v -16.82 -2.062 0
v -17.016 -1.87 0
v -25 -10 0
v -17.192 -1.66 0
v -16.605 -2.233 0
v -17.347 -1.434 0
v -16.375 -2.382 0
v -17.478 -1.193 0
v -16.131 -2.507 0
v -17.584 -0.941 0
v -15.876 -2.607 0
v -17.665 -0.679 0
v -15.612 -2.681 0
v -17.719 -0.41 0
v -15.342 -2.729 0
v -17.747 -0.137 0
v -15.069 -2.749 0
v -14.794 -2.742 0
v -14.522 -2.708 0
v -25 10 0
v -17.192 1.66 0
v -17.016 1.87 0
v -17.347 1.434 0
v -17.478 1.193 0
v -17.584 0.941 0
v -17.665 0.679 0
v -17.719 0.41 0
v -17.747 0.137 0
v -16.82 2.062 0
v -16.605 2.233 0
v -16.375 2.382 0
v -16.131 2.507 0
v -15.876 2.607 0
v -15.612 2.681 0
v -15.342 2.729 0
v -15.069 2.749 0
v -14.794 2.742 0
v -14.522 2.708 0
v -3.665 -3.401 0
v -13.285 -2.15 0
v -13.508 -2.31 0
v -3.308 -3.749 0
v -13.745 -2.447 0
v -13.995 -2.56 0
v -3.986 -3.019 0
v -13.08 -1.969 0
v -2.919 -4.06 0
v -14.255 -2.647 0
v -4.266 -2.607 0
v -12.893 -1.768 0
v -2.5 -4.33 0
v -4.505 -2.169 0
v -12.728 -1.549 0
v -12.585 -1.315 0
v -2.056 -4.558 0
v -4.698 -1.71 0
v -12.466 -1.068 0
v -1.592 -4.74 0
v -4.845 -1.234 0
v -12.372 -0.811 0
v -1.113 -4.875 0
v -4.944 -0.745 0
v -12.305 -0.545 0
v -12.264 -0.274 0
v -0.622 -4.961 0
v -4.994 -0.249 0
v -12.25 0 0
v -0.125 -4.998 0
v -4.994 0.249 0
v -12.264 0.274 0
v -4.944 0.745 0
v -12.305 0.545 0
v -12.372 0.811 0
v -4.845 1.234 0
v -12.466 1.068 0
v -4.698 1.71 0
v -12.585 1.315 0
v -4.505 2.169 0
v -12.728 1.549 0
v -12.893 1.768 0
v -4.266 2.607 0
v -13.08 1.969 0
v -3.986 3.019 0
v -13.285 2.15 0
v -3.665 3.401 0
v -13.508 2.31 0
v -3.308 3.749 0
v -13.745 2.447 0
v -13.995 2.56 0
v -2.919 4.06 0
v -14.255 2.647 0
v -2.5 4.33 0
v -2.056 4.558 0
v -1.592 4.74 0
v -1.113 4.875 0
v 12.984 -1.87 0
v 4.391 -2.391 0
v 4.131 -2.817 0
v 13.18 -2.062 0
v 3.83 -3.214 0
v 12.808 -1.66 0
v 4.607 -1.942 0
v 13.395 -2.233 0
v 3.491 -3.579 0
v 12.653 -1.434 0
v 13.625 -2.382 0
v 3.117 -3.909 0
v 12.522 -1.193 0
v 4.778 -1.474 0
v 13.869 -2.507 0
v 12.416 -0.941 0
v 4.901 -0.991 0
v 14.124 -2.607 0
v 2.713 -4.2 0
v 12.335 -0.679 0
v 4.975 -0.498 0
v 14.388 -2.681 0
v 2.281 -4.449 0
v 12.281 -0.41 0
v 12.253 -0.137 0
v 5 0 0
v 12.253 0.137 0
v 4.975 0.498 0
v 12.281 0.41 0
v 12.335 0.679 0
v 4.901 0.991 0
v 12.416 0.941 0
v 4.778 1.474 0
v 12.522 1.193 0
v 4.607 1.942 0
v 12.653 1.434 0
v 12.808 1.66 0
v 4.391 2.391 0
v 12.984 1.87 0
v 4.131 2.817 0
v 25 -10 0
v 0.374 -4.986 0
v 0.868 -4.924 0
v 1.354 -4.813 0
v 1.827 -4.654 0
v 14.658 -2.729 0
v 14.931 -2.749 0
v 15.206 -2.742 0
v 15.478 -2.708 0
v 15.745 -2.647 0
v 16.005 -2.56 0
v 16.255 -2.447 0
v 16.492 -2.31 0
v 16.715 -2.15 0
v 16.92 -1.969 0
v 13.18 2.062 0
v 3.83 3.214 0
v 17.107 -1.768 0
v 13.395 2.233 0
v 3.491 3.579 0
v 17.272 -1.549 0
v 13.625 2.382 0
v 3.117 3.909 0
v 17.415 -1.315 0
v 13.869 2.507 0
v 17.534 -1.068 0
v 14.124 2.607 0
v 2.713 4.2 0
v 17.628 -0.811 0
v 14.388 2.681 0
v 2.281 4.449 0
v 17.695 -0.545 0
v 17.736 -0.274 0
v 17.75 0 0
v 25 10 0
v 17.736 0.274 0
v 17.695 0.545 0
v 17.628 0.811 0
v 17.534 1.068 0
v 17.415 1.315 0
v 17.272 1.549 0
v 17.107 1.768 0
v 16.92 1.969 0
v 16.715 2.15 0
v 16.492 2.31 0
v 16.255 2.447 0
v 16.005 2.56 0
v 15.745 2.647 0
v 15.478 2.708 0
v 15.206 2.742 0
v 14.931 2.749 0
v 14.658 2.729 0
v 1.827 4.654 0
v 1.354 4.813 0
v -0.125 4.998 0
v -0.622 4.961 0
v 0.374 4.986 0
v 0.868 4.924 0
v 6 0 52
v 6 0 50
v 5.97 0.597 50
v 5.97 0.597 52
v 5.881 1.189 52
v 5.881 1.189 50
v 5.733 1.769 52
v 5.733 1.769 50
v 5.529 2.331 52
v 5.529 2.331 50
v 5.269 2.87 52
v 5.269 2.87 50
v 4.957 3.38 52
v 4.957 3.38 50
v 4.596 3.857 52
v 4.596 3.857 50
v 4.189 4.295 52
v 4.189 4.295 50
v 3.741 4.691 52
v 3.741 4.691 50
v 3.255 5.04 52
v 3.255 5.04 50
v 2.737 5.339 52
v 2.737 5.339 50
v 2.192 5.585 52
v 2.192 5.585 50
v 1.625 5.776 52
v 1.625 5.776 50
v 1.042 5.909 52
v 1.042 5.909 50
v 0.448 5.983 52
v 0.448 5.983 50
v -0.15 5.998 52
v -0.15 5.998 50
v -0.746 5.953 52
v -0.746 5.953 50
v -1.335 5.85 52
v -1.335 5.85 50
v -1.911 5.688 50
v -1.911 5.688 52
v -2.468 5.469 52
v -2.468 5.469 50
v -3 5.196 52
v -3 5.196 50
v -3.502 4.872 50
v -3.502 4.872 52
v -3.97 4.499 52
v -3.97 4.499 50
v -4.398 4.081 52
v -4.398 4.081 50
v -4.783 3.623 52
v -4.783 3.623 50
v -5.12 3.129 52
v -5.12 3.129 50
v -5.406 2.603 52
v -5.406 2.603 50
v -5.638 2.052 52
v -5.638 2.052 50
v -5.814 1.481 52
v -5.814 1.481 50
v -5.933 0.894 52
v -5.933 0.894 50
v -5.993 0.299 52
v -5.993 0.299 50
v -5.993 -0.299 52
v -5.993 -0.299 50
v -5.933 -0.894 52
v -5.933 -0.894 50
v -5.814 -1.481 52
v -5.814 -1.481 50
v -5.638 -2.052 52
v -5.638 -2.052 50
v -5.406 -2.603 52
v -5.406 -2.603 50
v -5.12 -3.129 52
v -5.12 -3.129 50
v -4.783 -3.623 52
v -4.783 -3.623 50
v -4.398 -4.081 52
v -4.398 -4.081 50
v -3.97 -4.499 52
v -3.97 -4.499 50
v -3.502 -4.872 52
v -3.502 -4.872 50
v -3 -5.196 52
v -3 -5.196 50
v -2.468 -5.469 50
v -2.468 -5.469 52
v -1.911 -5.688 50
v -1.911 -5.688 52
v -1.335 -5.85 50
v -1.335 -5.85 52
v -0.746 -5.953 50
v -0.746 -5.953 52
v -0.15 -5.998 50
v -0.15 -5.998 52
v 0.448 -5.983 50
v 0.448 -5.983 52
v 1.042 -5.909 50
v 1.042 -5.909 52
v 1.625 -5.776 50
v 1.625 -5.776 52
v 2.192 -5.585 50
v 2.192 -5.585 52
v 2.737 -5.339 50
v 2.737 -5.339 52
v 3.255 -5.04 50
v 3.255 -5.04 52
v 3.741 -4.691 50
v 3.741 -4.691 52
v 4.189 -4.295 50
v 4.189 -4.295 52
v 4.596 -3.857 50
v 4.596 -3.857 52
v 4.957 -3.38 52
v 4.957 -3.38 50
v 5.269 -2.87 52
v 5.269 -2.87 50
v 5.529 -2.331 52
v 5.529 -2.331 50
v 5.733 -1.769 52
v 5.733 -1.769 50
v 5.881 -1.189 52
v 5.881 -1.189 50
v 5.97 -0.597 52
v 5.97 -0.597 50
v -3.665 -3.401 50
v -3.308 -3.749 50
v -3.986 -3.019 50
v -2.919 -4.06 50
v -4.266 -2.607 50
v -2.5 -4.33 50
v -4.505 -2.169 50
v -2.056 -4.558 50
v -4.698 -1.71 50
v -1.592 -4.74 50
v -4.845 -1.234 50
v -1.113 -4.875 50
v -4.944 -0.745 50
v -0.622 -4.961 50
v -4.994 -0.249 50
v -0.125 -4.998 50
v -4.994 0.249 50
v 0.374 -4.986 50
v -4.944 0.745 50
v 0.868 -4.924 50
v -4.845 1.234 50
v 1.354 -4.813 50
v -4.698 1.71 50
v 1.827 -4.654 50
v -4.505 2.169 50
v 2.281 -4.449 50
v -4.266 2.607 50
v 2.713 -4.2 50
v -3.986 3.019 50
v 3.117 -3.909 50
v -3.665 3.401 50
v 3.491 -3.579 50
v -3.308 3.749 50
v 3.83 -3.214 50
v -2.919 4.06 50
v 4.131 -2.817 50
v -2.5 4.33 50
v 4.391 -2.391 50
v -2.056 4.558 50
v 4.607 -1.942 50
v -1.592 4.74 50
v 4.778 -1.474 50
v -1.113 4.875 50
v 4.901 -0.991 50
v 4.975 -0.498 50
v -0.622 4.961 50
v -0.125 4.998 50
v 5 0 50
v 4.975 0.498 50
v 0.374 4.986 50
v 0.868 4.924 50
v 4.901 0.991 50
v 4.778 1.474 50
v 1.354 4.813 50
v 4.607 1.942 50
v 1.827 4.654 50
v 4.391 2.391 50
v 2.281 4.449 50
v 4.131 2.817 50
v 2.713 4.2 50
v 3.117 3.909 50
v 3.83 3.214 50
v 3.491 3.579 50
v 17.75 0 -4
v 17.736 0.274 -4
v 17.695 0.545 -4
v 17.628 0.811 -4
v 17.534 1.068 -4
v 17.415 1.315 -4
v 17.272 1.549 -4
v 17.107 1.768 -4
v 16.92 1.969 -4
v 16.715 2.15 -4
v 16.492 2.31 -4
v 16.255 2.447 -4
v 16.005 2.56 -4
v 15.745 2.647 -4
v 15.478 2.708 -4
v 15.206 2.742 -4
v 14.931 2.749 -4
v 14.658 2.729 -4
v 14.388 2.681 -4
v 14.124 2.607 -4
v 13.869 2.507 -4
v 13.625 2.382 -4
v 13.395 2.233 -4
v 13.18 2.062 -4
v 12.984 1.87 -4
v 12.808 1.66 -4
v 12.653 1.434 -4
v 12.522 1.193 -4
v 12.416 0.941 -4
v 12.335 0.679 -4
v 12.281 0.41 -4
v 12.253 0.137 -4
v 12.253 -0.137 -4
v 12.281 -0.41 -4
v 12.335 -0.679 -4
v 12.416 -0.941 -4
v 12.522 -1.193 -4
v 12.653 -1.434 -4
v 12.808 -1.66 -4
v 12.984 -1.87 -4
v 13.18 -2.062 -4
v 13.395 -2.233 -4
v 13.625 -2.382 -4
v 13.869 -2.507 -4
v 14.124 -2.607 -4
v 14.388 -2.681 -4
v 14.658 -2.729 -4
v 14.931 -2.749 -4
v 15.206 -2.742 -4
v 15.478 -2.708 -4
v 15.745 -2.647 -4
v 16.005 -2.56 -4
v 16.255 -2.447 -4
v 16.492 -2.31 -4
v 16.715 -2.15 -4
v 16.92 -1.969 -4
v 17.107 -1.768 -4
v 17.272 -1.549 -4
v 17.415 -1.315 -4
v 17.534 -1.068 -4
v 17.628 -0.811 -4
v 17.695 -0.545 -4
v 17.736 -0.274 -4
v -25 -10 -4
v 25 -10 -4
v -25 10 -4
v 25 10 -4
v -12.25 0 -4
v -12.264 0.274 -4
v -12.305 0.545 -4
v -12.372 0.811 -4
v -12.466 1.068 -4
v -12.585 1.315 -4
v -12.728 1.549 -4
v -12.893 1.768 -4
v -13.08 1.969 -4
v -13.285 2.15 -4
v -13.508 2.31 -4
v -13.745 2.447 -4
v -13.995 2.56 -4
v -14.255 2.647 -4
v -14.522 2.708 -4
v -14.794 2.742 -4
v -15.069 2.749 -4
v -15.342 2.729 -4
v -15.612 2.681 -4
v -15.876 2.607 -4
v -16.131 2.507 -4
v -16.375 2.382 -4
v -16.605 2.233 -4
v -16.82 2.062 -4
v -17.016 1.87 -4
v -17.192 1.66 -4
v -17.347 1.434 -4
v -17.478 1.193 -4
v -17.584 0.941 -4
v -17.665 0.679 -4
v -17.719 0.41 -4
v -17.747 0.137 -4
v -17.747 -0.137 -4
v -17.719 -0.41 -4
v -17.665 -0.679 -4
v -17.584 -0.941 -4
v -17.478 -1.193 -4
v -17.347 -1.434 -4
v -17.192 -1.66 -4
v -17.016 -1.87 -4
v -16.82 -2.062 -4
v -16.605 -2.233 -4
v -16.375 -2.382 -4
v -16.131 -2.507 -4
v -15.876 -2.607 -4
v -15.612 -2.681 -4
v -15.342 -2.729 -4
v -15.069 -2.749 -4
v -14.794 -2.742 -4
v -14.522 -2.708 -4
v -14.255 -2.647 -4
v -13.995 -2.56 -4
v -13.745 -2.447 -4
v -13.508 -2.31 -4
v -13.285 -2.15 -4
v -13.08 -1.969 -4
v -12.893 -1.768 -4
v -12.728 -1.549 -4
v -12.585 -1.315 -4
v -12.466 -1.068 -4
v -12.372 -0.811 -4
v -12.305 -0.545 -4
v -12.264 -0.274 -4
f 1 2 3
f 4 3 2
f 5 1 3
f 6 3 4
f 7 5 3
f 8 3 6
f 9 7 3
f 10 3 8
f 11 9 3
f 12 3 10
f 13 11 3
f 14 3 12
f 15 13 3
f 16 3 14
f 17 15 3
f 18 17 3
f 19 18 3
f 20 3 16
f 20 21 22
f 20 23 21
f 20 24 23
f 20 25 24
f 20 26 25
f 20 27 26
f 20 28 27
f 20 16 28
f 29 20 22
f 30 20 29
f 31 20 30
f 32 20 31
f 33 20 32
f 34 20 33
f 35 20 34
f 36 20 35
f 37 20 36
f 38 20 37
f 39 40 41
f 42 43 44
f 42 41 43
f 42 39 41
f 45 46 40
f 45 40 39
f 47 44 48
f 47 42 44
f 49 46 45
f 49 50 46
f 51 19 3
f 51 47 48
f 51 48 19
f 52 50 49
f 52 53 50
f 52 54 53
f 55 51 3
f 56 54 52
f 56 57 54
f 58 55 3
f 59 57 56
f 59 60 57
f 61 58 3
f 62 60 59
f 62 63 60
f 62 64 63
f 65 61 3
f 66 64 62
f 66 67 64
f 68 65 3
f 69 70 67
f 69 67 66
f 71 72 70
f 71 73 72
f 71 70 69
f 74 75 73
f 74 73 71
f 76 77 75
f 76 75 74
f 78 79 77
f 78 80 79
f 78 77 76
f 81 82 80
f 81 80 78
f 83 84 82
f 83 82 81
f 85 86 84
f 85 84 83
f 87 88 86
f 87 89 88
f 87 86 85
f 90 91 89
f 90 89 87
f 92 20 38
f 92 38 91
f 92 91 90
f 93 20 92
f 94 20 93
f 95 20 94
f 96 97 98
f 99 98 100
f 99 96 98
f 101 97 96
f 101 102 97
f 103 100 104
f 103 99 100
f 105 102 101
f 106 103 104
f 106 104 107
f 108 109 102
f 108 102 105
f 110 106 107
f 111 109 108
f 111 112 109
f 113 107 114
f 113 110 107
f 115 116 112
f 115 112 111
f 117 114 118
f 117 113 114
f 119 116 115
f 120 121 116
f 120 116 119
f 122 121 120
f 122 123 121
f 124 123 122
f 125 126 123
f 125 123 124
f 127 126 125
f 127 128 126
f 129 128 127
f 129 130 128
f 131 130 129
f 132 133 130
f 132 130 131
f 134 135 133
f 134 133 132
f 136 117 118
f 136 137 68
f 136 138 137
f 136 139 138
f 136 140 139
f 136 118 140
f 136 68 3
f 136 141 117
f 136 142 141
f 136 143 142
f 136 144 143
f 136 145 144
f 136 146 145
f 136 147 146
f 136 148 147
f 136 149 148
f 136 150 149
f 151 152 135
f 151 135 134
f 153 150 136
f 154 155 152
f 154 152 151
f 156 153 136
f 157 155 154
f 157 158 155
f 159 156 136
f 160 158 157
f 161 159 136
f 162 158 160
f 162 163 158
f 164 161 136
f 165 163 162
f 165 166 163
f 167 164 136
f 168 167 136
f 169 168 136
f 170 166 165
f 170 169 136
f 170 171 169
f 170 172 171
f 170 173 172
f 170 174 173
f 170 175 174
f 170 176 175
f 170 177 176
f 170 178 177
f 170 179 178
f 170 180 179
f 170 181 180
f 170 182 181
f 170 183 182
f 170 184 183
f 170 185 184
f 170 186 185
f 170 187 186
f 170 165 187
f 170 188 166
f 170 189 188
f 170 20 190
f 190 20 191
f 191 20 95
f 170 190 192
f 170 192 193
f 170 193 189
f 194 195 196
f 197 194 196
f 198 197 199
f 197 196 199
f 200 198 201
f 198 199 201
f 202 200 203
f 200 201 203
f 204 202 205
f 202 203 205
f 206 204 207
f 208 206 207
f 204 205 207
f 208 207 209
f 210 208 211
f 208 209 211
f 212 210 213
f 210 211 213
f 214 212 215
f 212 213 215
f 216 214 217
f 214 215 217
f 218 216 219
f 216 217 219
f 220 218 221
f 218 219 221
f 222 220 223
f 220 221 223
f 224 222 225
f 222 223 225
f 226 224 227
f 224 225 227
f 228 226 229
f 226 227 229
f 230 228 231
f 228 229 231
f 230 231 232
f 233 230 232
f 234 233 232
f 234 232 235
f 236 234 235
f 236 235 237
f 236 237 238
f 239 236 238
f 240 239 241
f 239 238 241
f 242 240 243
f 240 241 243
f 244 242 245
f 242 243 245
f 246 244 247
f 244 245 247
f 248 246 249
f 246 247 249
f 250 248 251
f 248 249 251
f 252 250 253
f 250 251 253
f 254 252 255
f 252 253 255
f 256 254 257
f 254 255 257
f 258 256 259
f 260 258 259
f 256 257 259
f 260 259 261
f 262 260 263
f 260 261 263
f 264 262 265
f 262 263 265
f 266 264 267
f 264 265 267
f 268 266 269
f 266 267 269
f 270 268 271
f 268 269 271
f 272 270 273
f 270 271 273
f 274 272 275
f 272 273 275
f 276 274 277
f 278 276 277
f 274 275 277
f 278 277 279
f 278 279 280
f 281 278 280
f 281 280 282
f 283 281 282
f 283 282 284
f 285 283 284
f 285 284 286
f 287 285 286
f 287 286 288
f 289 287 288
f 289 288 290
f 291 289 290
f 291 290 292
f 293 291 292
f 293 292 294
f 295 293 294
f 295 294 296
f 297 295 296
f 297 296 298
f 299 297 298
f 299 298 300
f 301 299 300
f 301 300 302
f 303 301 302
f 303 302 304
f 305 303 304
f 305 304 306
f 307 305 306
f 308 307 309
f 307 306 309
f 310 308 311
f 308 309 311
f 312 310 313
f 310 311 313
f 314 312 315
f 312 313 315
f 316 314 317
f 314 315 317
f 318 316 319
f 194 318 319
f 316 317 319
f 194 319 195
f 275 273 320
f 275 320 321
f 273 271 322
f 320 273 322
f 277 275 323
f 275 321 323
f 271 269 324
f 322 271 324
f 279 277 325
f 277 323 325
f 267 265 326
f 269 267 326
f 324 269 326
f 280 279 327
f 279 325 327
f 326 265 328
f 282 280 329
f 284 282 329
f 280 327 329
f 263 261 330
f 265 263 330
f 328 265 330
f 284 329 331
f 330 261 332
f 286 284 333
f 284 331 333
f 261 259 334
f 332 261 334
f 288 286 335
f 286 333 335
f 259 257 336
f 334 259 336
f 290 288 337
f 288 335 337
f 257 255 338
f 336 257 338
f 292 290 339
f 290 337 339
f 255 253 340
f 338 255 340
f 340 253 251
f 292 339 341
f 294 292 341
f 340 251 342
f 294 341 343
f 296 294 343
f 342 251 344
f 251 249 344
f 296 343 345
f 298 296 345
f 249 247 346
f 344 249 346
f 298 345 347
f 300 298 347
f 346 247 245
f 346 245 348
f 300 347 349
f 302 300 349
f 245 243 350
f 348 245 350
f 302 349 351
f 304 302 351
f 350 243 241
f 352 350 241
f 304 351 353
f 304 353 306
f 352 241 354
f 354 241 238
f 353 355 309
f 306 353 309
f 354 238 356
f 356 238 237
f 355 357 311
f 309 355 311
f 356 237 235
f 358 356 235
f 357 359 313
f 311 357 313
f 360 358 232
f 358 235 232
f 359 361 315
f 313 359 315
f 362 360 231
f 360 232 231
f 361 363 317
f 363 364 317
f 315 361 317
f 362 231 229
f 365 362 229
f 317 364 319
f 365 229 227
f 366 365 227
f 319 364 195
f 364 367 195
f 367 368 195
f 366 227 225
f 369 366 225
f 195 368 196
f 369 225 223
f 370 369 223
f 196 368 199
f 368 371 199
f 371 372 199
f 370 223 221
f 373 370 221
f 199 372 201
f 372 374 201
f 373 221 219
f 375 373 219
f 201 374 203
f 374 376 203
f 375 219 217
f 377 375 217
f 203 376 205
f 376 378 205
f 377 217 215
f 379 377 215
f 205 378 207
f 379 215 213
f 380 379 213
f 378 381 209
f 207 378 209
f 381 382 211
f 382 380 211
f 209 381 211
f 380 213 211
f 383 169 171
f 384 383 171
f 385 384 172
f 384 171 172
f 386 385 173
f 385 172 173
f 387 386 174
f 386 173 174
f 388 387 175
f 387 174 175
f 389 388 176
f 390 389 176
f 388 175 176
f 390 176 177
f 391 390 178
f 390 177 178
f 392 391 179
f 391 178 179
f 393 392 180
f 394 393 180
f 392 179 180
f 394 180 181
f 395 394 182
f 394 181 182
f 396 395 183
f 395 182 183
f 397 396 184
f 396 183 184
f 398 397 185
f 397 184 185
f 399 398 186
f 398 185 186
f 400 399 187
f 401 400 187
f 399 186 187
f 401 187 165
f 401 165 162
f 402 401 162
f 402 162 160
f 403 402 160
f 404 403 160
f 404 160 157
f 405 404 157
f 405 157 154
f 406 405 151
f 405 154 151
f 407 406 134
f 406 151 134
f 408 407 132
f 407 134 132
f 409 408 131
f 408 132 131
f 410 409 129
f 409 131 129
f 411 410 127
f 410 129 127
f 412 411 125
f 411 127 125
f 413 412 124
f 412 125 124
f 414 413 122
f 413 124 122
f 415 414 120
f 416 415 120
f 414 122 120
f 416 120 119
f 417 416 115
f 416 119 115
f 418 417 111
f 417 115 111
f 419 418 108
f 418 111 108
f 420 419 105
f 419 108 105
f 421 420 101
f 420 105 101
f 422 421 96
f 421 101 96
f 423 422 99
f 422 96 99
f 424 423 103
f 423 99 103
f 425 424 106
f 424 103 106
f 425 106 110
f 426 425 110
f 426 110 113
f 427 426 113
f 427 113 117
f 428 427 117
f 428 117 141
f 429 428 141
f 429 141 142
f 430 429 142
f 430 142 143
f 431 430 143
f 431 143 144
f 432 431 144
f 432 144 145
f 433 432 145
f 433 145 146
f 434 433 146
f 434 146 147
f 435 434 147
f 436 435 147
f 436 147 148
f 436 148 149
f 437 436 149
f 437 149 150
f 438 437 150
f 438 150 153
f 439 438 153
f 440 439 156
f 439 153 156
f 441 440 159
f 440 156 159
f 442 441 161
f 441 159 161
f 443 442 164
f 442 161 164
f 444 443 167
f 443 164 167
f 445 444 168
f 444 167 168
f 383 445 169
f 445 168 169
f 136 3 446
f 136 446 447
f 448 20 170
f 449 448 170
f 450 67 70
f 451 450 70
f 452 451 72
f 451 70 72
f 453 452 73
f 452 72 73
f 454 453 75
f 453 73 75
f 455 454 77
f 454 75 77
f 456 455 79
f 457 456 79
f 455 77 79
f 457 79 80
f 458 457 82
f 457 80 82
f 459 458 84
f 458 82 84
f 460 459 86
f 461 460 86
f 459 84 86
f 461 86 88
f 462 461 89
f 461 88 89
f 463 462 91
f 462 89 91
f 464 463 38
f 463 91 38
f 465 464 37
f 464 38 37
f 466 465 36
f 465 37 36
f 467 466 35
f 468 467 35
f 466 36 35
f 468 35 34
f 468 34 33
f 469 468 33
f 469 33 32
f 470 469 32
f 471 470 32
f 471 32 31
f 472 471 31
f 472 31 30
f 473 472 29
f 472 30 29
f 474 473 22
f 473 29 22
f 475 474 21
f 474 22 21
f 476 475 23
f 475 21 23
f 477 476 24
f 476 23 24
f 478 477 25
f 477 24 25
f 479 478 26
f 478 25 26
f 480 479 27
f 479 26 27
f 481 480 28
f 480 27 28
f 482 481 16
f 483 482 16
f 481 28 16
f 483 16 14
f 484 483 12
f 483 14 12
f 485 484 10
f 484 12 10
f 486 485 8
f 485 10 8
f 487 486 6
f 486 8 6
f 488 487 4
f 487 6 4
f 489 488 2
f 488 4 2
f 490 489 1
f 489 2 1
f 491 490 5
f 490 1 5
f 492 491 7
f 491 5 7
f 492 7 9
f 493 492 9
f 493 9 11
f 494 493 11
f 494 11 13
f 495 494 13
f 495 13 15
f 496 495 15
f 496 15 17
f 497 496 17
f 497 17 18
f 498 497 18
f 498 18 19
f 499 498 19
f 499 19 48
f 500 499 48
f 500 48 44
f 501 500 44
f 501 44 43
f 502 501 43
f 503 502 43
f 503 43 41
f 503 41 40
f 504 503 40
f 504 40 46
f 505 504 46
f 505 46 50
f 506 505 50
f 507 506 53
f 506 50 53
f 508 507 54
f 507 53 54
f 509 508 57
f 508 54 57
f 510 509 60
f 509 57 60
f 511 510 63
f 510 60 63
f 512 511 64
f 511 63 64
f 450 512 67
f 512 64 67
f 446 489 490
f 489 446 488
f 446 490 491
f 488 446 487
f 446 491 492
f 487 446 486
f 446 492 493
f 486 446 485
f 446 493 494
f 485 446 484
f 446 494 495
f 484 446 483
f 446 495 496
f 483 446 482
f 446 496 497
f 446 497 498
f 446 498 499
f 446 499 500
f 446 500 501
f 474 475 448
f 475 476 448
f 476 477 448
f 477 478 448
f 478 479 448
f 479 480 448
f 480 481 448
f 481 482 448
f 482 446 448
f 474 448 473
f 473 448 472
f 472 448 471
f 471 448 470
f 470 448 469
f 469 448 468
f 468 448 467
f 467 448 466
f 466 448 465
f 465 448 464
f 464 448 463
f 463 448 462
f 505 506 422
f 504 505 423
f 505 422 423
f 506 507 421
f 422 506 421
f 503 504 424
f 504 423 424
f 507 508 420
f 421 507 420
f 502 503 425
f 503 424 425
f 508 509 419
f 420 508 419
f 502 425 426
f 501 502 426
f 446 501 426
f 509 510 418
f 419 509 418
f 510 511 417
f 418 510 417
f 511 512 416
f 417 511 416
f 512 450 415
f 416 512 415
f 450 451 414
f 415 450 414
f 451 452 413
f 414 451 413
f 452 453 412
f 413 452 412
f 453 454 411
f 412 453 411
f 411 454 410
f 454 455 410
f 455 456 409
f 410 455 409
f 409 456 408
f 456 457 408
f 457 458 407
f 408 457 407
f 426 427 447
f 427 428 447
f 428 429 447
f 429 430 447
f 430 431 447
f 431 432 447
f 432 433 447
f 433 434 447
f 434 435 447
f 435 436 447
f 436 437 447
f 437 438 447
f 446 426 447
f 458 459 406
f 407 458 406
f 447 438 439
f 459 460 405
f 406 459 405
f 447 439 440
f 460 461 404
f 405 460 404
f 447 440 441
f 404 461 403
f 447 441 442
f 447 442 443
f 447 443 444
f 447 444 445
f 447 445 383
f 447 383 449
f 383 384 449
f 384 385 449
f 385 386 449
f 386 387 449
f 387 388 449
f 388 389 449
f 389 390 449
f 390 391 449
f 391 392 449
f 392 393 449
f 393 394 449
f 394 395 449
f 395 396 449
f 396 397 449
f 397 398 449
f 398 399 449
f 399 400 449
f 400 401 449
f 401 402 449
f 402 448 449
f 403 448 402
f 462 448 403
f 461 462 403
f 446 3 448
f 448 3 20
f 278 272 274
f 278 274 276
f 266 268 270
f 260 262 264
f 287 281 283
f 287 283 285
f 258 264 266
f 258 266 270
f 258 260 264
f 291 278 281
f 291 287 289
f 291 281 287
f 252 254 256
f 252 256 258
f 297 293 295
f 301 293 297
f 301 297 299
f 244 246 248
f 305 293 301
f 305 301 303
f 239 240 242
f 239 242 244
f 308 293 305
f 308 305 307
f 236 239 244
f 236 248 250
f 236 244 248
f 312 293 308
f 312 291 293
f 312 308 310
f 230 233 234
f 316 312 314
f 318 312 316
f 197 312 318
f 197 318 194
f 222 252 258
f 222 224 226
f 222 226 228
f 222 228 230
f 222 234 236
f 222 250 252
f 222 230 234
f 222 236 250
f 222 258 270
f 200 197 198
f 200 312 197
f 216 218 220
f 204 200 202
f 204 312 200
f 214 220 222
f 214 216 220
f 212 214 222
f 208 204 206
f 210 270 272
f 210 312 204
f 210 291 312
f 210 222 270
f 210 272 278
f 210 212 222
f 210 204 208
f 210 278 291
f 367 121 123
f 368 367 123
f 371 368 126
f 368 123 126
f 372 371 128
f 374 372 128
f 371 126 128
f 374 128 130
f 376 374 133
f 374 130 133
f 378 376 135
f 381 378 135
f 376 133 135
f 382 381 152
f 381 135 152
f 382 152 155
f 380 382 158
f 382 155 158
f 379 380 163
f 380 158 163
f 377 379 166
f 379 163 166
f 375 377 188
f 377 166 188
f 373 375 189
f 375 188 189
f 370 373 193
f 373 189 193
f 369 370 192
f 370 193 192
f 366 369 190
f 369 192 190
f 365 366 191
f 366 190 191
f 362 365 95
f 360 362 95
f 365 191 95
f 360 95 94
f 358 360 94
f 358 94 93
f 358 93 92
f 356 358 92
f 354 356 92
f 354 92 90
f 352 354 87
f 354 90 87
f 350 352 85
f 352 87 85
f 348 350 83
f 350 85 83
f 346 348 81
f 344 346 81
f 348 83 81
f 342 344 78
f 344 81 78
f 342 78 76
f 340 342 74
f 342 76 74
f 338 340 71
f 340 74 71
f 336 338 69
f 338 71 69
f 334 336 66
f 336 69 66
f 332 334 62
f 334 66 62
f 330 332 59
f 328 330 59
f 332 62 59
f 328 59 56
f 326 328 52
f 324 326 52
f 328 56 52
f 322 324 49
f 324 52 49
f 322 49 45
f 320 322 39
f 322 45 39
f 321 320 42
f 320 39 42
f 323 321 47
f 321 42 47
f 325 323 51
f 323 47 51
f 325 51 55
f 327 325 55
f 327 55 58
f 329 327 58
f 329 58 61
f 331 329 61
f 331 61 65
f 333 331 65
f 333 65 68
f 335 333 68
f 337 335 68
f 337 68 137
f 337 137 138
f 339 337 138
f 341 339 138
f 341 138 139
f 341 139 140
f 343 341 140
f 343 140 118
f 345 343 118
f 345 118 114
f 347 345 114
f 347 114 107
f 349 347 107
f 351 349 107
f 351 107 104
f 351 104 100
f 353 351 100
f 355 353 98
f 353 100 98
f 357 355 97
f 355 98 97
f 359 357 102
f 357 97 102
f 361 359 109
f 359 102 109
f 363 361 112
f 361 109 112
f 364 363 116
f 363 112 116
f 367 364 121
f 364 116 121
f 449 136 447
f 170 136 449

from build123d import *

# Parameters (mm, degrees)
SKETCH1_W           = 50
SKETCH1_H           = 20
SKETCH1_R           = 2.75
BOSS_EXTRUDE1_DEPTH = 4
SKETCH2_R           = 5
BOSS_EXTRUDE2_DEPTH = 50
SKETCH3_R           = 6
BOSS_EXTRUDE3_DEPTH = 2


with BuildPart() as part:
    # Sketch1 → Boss-Extrude1 (new body)
    with BuildSketch(Plane.XY):
        Rectangle(SKETCH1_W, SKETCH1_H)
        with Locations((15, 0)):
            Circle(SKETCH1_R, mode=Mode.SUBTRACT)
        with Locations((-15, 0)):
            Circle(SKETCH1_R, mode=Mode.SUBTRACT)
    extrude(amount=-BOSS_EXTRUDE1_DEPTH)

    # Sketch2 → Boss-Extrude2 (add)
    with BuildSketch(Plane.XY):
        Circle(SKETCH2_R)
    extrude(amount=BOSS_EXTRUDE2_DEPTH)

    # Sketch3 → Boss-Extrude3 (add)
    with BuildSketch(Plane.XY.offset(50)):
        Circle(SKETCH3_R)
    extrude(amount=BOSS_EXTRUDE3_DEPTH)


solid = part.part
